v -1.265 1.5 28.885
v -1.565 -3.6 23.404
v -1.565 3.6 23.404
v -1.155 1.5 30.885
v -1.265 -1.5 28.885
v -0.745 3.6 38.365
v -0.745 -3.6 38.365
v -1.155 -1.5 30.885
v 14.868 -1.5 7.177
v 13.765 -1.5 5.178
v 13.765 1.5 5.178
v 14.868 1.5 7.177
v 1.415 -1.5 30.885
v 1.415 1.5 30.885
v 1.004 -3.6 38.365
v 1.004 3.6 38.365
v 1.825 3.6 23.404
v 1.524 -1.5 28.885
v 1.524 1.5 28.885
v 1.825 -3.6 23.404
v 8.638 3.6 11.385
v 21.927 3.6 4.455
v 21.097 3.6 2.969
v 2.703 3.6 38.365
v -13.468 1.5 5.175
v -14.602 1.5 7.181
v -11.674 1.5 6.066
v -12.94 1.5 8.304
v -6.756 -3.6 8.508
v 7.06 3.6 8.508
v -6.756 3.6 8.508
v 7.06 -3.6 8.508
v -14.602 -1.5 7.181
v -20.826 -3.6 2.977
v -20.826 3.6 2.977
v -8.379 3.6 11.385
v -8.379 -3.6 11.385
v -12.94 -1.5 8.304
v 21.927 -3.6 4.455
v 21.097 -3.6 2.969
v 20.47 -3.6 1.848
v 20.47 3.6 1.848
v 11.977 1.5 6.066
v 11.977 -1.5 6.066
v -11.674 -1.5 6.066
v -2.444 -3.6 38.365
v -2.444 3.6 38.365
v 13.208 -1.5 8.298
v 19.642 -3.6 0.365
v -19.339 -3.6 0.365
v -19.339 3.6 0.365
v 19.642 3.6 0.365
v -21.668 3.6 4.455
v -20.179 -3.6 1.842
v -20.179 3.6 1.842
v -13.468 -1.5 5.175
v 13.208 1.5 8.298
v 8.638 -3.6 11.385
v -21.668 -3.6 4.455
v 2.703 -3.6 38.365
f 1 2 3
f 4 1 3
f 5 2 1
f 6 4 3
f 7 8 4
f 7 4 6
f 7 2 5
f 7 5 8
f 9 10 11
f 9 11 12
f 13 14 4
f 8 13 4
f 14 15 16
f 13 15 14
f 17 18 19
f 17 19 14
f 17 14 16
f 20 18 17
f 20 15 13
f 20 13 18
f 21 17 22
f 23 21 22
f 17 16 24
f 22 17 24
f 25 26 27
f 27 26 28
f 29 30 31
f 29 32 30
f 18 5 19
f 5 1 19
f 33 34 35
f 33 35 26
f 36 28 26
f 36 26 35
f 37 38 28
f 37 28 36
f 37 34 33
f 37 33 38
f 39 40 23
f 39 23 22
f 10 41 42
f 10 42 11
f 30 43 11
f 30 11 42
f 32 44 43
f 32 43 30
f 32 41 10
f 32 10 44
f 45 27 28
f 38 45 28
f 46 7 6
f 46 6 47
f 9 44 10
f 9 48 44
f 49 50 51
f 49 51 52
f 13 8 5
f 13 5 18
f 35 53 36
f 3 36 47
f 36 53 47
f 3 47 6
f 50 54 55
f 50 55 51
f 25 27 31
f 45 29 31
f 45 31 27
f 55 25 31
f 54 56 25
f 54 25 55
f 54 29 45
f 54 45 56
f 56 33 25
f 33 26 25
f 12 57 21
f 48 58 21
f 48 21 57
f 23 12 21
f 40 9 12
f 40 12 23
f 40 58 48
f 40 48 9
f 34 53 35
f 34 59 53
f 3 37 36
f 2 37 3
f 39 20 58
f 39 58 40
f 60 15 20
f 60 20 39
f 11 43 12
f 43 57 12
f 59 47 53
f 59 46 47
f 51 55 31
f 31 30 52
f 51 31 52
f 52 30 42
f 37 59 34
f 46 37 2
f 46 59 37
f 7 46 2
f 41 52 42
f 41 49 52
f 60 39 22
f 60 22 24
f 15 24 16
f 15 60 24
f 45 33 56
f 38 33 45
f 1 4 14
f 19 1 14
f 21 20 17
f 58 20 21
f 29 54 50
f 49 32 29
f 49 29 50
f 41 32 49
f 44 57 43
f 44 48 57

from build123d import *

# Parameters (mm, degrees)
F1_DEPTH = 3.6
F3_DEPTH = 1.5


with BuildPart() as f1:
    # F0 (on Front) → F1 (new body, symmetric)
    with BuildSketch(Plane.XZ):
        Polygon((-20.8257506798, 2.9768245619), (-8.3789686798, 11.3850395619), (-1.5652516798, 23.4041475619), (-0.7448276798, 38.3654525619), (-2.4436836798, 38.3654525619), (-21.6676586798, 4.4551755619), align=None)
    extrude(amount=F1_DEPTH, both=True)



with BuildPart() as f1b:
    # F0 (on Front) → F1, piece 2 (new body, symmetric)
    with BuildSketch(Plane.XZ):
        Polygon((1.8247563202, 23.4041475619), (8.6384733202, 11.3850395619), (21.0967113202, 2.9690845619), (21.9271633202, 4.4551755619), (2.7031873202, 38.3654525619), (1.0043313202, 38.3654525619), align=None)
    extrude(amount=F1_DEPTH, both=True)


with BuildPart() as f1c:
    # F0 (on Front) → F1, piece 3 (new body, symmetric)
    with BuildSketch(Plane.XZ):
        Polygon((7.0596503202, 8.5081085619), (-6.7564876798, 8.5081085619), (-20.1794006798, 1.8418635619), (-19.3385966798, 0.3654525619), (19.6417593202, 0.3654525619), (20.4702253202, 1.8479905619), align=None)
    extrude(amount=F1_DEPTH, both=True)


with BuildPart() as f1_1:
    add(f1.part)

    add(f1b.part)  # F3 merges F1b

    add(f1c.part)  # F3 merges F1c
    # F2 (on Front) → F3 (join, symmetric)
    with BuildSketch(Plane.XZ):
        Polygon((1.4145438202, 30.8848000619), (-1.1550396798, 30.8848000619), (-1.2647124657, 28.8848000619), (1.5242167398, 28.8848000619), align=None)
        Polygon((-12.939735993, 8.3040896316), (-14.6023596798, 7.1809320619), (-13.4679441798, 5.1749860619), (-11.6739917823, 6.0659198107), align=None)
        Polygon((11.9765909947, 6.0661994647), (13.7649378202, 5.1780495619), (14.8675923202, 7.1770620619), (13.207815063, 8.2982969193), align=None)
    extrude(amount=F3_DEPTH, both=True)


solid = f1_1.part
